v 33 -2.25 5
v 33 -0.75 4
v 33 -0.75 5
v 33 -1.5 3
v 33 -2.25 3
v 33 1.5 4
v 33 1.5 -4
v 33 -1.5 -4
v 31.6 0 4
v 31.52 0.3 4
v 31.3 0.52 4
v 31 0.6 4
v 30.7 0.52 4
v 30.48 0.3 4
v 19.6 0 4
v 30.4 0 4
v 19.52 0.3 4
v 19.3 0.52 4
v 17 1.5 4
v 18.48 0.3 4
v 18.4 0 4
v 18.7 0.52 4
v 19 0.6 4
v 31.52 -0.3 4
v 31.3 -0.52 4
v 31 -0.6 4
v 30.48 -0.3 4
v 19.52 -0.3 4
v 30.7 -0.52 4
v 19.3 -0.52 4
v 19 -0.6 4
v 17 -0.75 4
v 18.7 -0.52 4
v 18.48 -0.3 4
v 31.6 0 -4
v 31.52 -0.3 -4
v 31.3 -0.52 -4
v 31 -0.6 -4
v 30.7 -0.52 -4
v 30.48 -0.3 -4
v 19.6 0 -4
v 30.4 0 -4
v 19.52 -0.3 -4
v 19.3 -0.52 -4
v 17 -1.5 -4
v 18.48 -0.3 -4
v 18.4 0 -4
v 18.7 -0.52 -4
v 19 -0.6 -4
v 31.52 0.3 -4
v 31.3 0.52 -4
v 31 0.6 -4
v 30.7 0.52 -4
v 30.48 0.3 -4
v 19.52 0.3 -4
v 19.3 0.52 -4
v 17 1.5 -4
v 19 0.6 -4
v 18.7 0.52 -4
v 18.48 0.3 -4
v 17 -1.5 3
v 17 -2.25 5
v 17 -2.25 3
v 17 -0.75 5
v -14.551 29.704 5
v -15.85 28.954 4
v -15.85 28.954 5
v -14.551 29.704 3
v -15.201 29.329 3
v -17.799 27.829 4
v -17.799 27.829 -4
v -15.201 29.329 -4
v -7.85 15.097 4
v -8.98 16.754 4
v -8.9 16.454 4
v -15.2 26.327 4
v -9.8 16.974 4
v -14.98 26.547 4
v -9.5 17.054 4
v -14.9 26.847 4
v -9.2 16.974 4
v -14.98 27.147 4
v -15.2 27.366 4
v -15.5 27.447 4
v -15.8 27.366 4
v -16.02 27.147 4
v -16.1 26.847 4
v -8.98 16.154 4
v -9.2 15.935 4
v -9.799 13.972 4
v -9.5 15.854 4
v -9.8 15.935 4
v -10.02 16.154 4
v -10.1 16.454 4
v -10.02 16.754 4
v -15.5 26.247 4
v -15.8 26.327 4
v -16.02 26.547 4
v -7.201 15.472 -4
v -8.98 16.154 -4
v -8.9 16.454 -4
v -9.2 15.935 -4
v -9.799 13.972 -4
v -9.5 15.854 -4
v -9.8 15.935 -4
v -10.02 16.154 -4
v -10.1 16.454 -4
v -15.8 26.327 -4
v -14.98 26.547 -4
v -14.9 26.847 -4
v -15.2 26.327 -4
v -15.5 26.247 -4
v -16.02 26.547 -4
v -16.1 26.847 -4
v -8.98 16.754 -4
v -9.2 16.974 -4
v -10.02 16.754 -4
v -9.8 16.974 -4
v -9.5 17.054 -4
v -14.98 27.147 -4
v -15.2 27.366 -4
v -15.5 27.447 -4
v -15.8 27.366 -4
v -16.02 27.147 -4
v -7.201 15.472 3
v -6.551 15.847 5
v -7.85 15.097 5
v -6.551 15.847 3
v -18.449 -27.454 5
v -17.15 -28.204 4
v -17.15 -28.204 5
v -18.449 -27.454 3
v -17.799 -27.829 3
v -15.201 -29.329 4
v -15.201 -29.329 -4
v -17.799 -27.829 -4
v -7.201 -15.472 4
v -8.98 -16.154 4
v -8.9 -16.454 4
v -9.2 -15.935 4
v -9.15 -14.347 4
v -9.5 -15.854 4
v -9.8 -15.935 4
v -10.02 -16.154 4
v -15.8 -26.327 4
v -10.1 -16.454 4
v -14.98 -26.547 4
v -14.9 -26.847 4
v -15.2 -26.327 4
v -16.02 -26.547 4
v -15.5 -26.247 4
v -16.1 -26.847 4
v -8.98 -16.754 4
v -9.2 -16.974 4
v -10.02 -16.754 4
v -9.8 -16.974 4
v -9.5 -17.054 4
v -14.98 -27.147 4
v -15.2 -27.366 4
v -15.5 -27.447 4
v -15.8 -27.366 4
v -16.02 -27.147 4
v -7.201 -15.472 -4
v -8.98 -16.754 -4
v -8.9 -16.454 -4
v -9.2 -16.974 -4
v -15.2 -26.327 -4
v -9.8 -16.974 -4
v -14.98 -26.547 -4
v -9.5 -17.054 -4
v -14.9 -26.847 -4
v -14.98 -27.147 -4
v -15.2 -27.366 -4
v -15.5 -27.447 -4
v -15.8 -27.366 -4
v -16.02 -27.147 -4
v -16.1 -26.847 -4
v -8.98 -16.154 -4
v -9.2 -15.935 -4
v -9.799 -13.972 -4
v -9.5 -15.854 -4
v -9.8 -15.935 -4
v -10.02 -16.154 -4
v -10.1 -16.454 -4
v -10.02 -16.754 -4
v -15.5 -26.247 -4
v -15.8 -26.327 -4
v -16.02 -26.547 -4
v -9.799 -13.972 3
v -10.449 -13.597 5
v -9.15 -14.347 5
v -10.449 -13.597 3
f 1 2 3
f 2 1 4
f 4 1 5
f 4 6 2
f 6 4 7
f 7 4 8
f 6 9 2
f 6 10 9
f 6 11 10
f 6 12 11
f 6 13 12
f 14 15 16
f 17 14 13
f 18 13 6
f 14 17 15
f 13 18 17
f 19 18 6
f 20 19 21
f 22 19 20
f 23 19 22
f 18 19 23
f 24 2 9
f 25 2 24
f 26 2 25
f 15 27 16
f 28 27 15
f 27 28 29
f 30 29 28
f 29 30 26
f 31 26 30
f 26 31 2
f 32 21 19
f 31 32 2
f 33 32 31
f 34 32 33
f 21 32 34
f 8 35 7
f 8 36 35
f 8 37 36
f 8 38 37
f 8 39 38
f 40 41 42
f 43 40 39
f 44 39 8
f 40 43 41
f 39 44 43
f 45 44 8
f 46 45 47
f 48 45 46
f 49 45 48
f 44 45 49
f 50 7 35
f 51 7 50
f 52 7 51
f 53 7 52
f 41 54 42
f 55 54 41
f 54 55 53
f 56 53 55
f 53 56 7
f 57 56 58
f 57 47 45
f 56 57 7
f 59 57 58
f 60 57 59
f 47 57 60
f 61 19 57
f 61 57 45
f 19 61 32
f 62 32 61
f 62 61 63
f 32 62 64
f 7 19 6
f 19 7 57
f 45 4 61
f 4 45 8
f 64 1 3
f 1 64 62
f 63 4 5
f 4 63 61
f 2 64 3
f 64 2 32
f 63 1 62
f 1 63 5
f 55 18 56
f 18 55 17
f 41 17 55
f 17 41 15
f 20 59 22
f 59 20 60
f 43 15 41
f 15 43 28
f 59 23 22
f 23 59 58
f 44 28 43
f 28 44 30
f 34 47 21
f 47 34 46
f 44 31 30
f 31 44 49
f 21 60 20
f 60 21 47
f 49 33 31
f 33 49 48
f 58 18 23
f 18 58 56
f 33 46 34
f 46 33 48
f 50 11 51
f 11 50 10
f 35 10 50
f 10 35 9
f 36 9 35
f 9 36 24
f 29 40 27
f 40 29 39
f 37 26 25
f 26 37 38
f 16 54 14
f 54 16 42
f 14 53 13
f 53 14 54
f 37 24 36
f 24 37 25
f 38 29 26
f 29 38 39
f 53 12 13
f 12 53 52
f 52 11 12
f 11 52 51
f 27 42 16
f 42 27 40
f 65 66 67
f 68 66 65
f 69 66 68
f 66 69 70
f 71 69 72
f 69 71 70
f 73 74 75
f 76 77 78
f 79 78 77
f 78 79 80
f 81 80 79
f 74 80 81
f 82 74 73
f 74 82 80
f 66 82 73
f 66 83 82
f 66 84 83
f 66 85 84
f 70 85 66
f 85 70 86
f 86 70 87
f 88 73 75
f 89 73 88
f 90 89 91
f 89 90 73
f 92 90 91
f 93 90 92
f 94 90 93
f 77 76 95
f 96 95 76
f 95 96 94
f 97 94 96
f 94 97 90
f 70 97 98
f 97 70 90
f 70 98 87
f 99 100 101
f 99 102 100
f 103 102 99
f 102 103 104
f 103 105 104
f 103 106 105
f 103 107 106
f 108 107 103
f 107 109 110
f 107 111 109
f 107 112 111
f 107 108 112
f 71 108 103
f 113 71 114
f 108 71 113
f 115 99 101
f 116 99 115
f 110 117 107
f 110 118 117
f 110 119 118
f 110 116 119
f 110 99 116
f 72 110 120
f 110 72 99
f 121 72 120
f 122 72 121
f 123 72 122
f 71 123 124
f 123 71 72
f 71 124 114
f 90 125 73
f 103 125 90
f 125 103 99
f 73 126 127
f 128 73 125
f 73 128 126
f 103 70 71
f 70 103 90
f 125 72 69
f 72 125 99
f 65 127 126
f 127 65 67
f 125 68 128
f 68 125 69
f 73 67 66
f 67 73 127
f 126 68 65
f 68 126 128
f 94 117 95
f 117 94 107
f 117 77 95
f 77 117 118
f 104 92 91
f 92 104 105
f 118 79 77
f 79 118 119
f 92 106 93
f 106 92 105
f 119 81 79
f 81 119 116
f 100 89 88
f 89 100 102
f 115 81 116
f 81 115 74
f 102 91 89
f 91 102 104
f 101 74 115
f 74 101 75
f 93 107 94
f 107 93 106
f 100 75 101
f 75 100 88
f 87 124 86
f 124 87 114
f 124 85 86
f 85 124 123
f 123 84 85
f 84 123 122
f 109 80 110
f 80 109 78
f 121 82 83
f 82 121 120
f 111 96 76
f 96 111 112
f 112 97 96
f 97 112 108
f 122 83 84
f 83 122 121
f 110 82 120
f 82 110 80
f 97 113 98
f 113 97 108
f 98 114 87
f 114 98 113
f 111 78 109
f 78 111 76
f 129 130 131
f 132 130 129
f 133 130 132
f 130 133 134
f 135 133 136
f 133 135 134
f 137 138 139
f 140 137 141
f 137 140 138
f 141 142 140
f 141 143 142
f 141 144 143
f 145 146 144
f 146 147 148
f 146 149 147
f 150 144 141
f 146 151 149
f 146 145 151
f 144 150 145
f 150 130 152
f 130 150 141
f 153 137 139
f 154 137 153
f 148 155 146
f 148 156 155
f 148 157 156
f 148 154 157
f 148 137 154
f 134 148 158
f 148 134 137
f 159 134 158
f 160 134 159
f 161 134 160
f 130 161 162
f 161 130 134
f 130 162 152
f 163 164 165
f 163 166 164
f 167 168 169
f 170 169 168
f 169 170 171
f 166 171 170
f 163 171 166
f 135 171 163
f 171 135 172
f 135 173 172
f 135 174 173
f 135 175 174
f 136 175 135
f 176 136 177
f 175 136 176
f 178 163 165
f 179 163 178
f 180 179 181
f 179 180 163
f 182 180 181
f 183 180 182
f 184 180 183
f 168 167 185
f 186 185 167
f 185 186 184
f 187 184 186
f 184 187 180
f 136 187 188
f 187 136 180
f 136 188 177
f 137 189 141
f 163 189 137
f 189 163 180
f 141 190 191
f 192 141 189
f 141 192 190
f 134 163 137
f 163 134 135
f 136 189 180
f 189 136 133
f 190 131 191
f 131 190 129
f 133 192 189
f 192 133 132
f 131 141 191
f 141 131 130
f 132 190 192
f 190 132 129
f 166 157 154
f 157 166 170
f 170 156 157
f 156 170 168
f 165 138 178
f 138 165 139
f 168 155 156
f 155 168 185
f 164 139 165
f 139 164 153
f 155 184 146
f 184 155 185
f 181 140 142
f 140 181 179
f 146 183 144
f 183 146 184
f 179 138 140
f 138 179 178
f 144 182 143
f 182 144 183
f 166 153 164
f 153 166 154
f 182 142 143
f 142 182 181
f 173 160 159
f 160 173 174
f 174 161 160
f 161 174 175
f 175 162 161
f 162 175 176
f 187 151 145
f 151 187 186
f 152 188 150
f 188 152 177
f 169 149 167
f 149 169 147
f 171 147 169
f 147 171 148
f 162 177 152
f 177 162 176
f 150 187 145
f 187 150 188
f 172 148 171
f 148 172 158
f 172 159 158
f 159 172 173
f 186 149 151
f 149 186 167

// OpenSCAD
// ============================================================
// Orb V2 — 麦克风阵列孔位
// 3 MIC（INMP441），120° 均布
// ============================================================

// --- 参数 ---
mic_offset_r  = 25;      // 麦克风到中心距离
mic_hole_r    = 1;        // 麦克风孔半径 2mm → 1mm
mic_count     = 3;
mic_angles    = [0, 120, 240];
mic_pcb_w     = 14;       // INMP441 模块尺寸
mic_pcb_h     = 10;

module mic_array_holes(shell_thick = 2.5) {
    // 在壳体上打 3 个拾音孔
    for (angle = mic_angles) {
        rotate([0, 0, angle])
            translate([mic_offset_r, 0, -0.1])
                cylinder(h = shell_thick + 0.2, r = mic_hole_r, $fn = 24);
    }
}

// 麦克风 PCB 安装座
module mic_mounts() {
    for (angle = mic_angles) {
        rotate([0, 0, angle])
            translate([mic_offset_r, 0, 0])
                mic_mount_bracket();
    }
}

module mic_mount_bracket() {
    // L 型支架
    difference() {
        union() {
            cube([mic_pcb_w + 2, 3, 8], center = true);
            translate([0, -1.5, 4])
                cube([mic_pcb_w + 2, 1.5, 2], center = true);
        }
        // 螺丝孔
        for (dx = [-mic_pcb_w / 2 + 1, mic_pcb_w / 2 - 1]) {
            translate([dx, 0, -5])
                cylinder(h = 20, r = 0.6, $fn = 12);
        }
    }
}

mic_mounts();
// %mic_array_holes();  // 取消注释可显示拾音孔
